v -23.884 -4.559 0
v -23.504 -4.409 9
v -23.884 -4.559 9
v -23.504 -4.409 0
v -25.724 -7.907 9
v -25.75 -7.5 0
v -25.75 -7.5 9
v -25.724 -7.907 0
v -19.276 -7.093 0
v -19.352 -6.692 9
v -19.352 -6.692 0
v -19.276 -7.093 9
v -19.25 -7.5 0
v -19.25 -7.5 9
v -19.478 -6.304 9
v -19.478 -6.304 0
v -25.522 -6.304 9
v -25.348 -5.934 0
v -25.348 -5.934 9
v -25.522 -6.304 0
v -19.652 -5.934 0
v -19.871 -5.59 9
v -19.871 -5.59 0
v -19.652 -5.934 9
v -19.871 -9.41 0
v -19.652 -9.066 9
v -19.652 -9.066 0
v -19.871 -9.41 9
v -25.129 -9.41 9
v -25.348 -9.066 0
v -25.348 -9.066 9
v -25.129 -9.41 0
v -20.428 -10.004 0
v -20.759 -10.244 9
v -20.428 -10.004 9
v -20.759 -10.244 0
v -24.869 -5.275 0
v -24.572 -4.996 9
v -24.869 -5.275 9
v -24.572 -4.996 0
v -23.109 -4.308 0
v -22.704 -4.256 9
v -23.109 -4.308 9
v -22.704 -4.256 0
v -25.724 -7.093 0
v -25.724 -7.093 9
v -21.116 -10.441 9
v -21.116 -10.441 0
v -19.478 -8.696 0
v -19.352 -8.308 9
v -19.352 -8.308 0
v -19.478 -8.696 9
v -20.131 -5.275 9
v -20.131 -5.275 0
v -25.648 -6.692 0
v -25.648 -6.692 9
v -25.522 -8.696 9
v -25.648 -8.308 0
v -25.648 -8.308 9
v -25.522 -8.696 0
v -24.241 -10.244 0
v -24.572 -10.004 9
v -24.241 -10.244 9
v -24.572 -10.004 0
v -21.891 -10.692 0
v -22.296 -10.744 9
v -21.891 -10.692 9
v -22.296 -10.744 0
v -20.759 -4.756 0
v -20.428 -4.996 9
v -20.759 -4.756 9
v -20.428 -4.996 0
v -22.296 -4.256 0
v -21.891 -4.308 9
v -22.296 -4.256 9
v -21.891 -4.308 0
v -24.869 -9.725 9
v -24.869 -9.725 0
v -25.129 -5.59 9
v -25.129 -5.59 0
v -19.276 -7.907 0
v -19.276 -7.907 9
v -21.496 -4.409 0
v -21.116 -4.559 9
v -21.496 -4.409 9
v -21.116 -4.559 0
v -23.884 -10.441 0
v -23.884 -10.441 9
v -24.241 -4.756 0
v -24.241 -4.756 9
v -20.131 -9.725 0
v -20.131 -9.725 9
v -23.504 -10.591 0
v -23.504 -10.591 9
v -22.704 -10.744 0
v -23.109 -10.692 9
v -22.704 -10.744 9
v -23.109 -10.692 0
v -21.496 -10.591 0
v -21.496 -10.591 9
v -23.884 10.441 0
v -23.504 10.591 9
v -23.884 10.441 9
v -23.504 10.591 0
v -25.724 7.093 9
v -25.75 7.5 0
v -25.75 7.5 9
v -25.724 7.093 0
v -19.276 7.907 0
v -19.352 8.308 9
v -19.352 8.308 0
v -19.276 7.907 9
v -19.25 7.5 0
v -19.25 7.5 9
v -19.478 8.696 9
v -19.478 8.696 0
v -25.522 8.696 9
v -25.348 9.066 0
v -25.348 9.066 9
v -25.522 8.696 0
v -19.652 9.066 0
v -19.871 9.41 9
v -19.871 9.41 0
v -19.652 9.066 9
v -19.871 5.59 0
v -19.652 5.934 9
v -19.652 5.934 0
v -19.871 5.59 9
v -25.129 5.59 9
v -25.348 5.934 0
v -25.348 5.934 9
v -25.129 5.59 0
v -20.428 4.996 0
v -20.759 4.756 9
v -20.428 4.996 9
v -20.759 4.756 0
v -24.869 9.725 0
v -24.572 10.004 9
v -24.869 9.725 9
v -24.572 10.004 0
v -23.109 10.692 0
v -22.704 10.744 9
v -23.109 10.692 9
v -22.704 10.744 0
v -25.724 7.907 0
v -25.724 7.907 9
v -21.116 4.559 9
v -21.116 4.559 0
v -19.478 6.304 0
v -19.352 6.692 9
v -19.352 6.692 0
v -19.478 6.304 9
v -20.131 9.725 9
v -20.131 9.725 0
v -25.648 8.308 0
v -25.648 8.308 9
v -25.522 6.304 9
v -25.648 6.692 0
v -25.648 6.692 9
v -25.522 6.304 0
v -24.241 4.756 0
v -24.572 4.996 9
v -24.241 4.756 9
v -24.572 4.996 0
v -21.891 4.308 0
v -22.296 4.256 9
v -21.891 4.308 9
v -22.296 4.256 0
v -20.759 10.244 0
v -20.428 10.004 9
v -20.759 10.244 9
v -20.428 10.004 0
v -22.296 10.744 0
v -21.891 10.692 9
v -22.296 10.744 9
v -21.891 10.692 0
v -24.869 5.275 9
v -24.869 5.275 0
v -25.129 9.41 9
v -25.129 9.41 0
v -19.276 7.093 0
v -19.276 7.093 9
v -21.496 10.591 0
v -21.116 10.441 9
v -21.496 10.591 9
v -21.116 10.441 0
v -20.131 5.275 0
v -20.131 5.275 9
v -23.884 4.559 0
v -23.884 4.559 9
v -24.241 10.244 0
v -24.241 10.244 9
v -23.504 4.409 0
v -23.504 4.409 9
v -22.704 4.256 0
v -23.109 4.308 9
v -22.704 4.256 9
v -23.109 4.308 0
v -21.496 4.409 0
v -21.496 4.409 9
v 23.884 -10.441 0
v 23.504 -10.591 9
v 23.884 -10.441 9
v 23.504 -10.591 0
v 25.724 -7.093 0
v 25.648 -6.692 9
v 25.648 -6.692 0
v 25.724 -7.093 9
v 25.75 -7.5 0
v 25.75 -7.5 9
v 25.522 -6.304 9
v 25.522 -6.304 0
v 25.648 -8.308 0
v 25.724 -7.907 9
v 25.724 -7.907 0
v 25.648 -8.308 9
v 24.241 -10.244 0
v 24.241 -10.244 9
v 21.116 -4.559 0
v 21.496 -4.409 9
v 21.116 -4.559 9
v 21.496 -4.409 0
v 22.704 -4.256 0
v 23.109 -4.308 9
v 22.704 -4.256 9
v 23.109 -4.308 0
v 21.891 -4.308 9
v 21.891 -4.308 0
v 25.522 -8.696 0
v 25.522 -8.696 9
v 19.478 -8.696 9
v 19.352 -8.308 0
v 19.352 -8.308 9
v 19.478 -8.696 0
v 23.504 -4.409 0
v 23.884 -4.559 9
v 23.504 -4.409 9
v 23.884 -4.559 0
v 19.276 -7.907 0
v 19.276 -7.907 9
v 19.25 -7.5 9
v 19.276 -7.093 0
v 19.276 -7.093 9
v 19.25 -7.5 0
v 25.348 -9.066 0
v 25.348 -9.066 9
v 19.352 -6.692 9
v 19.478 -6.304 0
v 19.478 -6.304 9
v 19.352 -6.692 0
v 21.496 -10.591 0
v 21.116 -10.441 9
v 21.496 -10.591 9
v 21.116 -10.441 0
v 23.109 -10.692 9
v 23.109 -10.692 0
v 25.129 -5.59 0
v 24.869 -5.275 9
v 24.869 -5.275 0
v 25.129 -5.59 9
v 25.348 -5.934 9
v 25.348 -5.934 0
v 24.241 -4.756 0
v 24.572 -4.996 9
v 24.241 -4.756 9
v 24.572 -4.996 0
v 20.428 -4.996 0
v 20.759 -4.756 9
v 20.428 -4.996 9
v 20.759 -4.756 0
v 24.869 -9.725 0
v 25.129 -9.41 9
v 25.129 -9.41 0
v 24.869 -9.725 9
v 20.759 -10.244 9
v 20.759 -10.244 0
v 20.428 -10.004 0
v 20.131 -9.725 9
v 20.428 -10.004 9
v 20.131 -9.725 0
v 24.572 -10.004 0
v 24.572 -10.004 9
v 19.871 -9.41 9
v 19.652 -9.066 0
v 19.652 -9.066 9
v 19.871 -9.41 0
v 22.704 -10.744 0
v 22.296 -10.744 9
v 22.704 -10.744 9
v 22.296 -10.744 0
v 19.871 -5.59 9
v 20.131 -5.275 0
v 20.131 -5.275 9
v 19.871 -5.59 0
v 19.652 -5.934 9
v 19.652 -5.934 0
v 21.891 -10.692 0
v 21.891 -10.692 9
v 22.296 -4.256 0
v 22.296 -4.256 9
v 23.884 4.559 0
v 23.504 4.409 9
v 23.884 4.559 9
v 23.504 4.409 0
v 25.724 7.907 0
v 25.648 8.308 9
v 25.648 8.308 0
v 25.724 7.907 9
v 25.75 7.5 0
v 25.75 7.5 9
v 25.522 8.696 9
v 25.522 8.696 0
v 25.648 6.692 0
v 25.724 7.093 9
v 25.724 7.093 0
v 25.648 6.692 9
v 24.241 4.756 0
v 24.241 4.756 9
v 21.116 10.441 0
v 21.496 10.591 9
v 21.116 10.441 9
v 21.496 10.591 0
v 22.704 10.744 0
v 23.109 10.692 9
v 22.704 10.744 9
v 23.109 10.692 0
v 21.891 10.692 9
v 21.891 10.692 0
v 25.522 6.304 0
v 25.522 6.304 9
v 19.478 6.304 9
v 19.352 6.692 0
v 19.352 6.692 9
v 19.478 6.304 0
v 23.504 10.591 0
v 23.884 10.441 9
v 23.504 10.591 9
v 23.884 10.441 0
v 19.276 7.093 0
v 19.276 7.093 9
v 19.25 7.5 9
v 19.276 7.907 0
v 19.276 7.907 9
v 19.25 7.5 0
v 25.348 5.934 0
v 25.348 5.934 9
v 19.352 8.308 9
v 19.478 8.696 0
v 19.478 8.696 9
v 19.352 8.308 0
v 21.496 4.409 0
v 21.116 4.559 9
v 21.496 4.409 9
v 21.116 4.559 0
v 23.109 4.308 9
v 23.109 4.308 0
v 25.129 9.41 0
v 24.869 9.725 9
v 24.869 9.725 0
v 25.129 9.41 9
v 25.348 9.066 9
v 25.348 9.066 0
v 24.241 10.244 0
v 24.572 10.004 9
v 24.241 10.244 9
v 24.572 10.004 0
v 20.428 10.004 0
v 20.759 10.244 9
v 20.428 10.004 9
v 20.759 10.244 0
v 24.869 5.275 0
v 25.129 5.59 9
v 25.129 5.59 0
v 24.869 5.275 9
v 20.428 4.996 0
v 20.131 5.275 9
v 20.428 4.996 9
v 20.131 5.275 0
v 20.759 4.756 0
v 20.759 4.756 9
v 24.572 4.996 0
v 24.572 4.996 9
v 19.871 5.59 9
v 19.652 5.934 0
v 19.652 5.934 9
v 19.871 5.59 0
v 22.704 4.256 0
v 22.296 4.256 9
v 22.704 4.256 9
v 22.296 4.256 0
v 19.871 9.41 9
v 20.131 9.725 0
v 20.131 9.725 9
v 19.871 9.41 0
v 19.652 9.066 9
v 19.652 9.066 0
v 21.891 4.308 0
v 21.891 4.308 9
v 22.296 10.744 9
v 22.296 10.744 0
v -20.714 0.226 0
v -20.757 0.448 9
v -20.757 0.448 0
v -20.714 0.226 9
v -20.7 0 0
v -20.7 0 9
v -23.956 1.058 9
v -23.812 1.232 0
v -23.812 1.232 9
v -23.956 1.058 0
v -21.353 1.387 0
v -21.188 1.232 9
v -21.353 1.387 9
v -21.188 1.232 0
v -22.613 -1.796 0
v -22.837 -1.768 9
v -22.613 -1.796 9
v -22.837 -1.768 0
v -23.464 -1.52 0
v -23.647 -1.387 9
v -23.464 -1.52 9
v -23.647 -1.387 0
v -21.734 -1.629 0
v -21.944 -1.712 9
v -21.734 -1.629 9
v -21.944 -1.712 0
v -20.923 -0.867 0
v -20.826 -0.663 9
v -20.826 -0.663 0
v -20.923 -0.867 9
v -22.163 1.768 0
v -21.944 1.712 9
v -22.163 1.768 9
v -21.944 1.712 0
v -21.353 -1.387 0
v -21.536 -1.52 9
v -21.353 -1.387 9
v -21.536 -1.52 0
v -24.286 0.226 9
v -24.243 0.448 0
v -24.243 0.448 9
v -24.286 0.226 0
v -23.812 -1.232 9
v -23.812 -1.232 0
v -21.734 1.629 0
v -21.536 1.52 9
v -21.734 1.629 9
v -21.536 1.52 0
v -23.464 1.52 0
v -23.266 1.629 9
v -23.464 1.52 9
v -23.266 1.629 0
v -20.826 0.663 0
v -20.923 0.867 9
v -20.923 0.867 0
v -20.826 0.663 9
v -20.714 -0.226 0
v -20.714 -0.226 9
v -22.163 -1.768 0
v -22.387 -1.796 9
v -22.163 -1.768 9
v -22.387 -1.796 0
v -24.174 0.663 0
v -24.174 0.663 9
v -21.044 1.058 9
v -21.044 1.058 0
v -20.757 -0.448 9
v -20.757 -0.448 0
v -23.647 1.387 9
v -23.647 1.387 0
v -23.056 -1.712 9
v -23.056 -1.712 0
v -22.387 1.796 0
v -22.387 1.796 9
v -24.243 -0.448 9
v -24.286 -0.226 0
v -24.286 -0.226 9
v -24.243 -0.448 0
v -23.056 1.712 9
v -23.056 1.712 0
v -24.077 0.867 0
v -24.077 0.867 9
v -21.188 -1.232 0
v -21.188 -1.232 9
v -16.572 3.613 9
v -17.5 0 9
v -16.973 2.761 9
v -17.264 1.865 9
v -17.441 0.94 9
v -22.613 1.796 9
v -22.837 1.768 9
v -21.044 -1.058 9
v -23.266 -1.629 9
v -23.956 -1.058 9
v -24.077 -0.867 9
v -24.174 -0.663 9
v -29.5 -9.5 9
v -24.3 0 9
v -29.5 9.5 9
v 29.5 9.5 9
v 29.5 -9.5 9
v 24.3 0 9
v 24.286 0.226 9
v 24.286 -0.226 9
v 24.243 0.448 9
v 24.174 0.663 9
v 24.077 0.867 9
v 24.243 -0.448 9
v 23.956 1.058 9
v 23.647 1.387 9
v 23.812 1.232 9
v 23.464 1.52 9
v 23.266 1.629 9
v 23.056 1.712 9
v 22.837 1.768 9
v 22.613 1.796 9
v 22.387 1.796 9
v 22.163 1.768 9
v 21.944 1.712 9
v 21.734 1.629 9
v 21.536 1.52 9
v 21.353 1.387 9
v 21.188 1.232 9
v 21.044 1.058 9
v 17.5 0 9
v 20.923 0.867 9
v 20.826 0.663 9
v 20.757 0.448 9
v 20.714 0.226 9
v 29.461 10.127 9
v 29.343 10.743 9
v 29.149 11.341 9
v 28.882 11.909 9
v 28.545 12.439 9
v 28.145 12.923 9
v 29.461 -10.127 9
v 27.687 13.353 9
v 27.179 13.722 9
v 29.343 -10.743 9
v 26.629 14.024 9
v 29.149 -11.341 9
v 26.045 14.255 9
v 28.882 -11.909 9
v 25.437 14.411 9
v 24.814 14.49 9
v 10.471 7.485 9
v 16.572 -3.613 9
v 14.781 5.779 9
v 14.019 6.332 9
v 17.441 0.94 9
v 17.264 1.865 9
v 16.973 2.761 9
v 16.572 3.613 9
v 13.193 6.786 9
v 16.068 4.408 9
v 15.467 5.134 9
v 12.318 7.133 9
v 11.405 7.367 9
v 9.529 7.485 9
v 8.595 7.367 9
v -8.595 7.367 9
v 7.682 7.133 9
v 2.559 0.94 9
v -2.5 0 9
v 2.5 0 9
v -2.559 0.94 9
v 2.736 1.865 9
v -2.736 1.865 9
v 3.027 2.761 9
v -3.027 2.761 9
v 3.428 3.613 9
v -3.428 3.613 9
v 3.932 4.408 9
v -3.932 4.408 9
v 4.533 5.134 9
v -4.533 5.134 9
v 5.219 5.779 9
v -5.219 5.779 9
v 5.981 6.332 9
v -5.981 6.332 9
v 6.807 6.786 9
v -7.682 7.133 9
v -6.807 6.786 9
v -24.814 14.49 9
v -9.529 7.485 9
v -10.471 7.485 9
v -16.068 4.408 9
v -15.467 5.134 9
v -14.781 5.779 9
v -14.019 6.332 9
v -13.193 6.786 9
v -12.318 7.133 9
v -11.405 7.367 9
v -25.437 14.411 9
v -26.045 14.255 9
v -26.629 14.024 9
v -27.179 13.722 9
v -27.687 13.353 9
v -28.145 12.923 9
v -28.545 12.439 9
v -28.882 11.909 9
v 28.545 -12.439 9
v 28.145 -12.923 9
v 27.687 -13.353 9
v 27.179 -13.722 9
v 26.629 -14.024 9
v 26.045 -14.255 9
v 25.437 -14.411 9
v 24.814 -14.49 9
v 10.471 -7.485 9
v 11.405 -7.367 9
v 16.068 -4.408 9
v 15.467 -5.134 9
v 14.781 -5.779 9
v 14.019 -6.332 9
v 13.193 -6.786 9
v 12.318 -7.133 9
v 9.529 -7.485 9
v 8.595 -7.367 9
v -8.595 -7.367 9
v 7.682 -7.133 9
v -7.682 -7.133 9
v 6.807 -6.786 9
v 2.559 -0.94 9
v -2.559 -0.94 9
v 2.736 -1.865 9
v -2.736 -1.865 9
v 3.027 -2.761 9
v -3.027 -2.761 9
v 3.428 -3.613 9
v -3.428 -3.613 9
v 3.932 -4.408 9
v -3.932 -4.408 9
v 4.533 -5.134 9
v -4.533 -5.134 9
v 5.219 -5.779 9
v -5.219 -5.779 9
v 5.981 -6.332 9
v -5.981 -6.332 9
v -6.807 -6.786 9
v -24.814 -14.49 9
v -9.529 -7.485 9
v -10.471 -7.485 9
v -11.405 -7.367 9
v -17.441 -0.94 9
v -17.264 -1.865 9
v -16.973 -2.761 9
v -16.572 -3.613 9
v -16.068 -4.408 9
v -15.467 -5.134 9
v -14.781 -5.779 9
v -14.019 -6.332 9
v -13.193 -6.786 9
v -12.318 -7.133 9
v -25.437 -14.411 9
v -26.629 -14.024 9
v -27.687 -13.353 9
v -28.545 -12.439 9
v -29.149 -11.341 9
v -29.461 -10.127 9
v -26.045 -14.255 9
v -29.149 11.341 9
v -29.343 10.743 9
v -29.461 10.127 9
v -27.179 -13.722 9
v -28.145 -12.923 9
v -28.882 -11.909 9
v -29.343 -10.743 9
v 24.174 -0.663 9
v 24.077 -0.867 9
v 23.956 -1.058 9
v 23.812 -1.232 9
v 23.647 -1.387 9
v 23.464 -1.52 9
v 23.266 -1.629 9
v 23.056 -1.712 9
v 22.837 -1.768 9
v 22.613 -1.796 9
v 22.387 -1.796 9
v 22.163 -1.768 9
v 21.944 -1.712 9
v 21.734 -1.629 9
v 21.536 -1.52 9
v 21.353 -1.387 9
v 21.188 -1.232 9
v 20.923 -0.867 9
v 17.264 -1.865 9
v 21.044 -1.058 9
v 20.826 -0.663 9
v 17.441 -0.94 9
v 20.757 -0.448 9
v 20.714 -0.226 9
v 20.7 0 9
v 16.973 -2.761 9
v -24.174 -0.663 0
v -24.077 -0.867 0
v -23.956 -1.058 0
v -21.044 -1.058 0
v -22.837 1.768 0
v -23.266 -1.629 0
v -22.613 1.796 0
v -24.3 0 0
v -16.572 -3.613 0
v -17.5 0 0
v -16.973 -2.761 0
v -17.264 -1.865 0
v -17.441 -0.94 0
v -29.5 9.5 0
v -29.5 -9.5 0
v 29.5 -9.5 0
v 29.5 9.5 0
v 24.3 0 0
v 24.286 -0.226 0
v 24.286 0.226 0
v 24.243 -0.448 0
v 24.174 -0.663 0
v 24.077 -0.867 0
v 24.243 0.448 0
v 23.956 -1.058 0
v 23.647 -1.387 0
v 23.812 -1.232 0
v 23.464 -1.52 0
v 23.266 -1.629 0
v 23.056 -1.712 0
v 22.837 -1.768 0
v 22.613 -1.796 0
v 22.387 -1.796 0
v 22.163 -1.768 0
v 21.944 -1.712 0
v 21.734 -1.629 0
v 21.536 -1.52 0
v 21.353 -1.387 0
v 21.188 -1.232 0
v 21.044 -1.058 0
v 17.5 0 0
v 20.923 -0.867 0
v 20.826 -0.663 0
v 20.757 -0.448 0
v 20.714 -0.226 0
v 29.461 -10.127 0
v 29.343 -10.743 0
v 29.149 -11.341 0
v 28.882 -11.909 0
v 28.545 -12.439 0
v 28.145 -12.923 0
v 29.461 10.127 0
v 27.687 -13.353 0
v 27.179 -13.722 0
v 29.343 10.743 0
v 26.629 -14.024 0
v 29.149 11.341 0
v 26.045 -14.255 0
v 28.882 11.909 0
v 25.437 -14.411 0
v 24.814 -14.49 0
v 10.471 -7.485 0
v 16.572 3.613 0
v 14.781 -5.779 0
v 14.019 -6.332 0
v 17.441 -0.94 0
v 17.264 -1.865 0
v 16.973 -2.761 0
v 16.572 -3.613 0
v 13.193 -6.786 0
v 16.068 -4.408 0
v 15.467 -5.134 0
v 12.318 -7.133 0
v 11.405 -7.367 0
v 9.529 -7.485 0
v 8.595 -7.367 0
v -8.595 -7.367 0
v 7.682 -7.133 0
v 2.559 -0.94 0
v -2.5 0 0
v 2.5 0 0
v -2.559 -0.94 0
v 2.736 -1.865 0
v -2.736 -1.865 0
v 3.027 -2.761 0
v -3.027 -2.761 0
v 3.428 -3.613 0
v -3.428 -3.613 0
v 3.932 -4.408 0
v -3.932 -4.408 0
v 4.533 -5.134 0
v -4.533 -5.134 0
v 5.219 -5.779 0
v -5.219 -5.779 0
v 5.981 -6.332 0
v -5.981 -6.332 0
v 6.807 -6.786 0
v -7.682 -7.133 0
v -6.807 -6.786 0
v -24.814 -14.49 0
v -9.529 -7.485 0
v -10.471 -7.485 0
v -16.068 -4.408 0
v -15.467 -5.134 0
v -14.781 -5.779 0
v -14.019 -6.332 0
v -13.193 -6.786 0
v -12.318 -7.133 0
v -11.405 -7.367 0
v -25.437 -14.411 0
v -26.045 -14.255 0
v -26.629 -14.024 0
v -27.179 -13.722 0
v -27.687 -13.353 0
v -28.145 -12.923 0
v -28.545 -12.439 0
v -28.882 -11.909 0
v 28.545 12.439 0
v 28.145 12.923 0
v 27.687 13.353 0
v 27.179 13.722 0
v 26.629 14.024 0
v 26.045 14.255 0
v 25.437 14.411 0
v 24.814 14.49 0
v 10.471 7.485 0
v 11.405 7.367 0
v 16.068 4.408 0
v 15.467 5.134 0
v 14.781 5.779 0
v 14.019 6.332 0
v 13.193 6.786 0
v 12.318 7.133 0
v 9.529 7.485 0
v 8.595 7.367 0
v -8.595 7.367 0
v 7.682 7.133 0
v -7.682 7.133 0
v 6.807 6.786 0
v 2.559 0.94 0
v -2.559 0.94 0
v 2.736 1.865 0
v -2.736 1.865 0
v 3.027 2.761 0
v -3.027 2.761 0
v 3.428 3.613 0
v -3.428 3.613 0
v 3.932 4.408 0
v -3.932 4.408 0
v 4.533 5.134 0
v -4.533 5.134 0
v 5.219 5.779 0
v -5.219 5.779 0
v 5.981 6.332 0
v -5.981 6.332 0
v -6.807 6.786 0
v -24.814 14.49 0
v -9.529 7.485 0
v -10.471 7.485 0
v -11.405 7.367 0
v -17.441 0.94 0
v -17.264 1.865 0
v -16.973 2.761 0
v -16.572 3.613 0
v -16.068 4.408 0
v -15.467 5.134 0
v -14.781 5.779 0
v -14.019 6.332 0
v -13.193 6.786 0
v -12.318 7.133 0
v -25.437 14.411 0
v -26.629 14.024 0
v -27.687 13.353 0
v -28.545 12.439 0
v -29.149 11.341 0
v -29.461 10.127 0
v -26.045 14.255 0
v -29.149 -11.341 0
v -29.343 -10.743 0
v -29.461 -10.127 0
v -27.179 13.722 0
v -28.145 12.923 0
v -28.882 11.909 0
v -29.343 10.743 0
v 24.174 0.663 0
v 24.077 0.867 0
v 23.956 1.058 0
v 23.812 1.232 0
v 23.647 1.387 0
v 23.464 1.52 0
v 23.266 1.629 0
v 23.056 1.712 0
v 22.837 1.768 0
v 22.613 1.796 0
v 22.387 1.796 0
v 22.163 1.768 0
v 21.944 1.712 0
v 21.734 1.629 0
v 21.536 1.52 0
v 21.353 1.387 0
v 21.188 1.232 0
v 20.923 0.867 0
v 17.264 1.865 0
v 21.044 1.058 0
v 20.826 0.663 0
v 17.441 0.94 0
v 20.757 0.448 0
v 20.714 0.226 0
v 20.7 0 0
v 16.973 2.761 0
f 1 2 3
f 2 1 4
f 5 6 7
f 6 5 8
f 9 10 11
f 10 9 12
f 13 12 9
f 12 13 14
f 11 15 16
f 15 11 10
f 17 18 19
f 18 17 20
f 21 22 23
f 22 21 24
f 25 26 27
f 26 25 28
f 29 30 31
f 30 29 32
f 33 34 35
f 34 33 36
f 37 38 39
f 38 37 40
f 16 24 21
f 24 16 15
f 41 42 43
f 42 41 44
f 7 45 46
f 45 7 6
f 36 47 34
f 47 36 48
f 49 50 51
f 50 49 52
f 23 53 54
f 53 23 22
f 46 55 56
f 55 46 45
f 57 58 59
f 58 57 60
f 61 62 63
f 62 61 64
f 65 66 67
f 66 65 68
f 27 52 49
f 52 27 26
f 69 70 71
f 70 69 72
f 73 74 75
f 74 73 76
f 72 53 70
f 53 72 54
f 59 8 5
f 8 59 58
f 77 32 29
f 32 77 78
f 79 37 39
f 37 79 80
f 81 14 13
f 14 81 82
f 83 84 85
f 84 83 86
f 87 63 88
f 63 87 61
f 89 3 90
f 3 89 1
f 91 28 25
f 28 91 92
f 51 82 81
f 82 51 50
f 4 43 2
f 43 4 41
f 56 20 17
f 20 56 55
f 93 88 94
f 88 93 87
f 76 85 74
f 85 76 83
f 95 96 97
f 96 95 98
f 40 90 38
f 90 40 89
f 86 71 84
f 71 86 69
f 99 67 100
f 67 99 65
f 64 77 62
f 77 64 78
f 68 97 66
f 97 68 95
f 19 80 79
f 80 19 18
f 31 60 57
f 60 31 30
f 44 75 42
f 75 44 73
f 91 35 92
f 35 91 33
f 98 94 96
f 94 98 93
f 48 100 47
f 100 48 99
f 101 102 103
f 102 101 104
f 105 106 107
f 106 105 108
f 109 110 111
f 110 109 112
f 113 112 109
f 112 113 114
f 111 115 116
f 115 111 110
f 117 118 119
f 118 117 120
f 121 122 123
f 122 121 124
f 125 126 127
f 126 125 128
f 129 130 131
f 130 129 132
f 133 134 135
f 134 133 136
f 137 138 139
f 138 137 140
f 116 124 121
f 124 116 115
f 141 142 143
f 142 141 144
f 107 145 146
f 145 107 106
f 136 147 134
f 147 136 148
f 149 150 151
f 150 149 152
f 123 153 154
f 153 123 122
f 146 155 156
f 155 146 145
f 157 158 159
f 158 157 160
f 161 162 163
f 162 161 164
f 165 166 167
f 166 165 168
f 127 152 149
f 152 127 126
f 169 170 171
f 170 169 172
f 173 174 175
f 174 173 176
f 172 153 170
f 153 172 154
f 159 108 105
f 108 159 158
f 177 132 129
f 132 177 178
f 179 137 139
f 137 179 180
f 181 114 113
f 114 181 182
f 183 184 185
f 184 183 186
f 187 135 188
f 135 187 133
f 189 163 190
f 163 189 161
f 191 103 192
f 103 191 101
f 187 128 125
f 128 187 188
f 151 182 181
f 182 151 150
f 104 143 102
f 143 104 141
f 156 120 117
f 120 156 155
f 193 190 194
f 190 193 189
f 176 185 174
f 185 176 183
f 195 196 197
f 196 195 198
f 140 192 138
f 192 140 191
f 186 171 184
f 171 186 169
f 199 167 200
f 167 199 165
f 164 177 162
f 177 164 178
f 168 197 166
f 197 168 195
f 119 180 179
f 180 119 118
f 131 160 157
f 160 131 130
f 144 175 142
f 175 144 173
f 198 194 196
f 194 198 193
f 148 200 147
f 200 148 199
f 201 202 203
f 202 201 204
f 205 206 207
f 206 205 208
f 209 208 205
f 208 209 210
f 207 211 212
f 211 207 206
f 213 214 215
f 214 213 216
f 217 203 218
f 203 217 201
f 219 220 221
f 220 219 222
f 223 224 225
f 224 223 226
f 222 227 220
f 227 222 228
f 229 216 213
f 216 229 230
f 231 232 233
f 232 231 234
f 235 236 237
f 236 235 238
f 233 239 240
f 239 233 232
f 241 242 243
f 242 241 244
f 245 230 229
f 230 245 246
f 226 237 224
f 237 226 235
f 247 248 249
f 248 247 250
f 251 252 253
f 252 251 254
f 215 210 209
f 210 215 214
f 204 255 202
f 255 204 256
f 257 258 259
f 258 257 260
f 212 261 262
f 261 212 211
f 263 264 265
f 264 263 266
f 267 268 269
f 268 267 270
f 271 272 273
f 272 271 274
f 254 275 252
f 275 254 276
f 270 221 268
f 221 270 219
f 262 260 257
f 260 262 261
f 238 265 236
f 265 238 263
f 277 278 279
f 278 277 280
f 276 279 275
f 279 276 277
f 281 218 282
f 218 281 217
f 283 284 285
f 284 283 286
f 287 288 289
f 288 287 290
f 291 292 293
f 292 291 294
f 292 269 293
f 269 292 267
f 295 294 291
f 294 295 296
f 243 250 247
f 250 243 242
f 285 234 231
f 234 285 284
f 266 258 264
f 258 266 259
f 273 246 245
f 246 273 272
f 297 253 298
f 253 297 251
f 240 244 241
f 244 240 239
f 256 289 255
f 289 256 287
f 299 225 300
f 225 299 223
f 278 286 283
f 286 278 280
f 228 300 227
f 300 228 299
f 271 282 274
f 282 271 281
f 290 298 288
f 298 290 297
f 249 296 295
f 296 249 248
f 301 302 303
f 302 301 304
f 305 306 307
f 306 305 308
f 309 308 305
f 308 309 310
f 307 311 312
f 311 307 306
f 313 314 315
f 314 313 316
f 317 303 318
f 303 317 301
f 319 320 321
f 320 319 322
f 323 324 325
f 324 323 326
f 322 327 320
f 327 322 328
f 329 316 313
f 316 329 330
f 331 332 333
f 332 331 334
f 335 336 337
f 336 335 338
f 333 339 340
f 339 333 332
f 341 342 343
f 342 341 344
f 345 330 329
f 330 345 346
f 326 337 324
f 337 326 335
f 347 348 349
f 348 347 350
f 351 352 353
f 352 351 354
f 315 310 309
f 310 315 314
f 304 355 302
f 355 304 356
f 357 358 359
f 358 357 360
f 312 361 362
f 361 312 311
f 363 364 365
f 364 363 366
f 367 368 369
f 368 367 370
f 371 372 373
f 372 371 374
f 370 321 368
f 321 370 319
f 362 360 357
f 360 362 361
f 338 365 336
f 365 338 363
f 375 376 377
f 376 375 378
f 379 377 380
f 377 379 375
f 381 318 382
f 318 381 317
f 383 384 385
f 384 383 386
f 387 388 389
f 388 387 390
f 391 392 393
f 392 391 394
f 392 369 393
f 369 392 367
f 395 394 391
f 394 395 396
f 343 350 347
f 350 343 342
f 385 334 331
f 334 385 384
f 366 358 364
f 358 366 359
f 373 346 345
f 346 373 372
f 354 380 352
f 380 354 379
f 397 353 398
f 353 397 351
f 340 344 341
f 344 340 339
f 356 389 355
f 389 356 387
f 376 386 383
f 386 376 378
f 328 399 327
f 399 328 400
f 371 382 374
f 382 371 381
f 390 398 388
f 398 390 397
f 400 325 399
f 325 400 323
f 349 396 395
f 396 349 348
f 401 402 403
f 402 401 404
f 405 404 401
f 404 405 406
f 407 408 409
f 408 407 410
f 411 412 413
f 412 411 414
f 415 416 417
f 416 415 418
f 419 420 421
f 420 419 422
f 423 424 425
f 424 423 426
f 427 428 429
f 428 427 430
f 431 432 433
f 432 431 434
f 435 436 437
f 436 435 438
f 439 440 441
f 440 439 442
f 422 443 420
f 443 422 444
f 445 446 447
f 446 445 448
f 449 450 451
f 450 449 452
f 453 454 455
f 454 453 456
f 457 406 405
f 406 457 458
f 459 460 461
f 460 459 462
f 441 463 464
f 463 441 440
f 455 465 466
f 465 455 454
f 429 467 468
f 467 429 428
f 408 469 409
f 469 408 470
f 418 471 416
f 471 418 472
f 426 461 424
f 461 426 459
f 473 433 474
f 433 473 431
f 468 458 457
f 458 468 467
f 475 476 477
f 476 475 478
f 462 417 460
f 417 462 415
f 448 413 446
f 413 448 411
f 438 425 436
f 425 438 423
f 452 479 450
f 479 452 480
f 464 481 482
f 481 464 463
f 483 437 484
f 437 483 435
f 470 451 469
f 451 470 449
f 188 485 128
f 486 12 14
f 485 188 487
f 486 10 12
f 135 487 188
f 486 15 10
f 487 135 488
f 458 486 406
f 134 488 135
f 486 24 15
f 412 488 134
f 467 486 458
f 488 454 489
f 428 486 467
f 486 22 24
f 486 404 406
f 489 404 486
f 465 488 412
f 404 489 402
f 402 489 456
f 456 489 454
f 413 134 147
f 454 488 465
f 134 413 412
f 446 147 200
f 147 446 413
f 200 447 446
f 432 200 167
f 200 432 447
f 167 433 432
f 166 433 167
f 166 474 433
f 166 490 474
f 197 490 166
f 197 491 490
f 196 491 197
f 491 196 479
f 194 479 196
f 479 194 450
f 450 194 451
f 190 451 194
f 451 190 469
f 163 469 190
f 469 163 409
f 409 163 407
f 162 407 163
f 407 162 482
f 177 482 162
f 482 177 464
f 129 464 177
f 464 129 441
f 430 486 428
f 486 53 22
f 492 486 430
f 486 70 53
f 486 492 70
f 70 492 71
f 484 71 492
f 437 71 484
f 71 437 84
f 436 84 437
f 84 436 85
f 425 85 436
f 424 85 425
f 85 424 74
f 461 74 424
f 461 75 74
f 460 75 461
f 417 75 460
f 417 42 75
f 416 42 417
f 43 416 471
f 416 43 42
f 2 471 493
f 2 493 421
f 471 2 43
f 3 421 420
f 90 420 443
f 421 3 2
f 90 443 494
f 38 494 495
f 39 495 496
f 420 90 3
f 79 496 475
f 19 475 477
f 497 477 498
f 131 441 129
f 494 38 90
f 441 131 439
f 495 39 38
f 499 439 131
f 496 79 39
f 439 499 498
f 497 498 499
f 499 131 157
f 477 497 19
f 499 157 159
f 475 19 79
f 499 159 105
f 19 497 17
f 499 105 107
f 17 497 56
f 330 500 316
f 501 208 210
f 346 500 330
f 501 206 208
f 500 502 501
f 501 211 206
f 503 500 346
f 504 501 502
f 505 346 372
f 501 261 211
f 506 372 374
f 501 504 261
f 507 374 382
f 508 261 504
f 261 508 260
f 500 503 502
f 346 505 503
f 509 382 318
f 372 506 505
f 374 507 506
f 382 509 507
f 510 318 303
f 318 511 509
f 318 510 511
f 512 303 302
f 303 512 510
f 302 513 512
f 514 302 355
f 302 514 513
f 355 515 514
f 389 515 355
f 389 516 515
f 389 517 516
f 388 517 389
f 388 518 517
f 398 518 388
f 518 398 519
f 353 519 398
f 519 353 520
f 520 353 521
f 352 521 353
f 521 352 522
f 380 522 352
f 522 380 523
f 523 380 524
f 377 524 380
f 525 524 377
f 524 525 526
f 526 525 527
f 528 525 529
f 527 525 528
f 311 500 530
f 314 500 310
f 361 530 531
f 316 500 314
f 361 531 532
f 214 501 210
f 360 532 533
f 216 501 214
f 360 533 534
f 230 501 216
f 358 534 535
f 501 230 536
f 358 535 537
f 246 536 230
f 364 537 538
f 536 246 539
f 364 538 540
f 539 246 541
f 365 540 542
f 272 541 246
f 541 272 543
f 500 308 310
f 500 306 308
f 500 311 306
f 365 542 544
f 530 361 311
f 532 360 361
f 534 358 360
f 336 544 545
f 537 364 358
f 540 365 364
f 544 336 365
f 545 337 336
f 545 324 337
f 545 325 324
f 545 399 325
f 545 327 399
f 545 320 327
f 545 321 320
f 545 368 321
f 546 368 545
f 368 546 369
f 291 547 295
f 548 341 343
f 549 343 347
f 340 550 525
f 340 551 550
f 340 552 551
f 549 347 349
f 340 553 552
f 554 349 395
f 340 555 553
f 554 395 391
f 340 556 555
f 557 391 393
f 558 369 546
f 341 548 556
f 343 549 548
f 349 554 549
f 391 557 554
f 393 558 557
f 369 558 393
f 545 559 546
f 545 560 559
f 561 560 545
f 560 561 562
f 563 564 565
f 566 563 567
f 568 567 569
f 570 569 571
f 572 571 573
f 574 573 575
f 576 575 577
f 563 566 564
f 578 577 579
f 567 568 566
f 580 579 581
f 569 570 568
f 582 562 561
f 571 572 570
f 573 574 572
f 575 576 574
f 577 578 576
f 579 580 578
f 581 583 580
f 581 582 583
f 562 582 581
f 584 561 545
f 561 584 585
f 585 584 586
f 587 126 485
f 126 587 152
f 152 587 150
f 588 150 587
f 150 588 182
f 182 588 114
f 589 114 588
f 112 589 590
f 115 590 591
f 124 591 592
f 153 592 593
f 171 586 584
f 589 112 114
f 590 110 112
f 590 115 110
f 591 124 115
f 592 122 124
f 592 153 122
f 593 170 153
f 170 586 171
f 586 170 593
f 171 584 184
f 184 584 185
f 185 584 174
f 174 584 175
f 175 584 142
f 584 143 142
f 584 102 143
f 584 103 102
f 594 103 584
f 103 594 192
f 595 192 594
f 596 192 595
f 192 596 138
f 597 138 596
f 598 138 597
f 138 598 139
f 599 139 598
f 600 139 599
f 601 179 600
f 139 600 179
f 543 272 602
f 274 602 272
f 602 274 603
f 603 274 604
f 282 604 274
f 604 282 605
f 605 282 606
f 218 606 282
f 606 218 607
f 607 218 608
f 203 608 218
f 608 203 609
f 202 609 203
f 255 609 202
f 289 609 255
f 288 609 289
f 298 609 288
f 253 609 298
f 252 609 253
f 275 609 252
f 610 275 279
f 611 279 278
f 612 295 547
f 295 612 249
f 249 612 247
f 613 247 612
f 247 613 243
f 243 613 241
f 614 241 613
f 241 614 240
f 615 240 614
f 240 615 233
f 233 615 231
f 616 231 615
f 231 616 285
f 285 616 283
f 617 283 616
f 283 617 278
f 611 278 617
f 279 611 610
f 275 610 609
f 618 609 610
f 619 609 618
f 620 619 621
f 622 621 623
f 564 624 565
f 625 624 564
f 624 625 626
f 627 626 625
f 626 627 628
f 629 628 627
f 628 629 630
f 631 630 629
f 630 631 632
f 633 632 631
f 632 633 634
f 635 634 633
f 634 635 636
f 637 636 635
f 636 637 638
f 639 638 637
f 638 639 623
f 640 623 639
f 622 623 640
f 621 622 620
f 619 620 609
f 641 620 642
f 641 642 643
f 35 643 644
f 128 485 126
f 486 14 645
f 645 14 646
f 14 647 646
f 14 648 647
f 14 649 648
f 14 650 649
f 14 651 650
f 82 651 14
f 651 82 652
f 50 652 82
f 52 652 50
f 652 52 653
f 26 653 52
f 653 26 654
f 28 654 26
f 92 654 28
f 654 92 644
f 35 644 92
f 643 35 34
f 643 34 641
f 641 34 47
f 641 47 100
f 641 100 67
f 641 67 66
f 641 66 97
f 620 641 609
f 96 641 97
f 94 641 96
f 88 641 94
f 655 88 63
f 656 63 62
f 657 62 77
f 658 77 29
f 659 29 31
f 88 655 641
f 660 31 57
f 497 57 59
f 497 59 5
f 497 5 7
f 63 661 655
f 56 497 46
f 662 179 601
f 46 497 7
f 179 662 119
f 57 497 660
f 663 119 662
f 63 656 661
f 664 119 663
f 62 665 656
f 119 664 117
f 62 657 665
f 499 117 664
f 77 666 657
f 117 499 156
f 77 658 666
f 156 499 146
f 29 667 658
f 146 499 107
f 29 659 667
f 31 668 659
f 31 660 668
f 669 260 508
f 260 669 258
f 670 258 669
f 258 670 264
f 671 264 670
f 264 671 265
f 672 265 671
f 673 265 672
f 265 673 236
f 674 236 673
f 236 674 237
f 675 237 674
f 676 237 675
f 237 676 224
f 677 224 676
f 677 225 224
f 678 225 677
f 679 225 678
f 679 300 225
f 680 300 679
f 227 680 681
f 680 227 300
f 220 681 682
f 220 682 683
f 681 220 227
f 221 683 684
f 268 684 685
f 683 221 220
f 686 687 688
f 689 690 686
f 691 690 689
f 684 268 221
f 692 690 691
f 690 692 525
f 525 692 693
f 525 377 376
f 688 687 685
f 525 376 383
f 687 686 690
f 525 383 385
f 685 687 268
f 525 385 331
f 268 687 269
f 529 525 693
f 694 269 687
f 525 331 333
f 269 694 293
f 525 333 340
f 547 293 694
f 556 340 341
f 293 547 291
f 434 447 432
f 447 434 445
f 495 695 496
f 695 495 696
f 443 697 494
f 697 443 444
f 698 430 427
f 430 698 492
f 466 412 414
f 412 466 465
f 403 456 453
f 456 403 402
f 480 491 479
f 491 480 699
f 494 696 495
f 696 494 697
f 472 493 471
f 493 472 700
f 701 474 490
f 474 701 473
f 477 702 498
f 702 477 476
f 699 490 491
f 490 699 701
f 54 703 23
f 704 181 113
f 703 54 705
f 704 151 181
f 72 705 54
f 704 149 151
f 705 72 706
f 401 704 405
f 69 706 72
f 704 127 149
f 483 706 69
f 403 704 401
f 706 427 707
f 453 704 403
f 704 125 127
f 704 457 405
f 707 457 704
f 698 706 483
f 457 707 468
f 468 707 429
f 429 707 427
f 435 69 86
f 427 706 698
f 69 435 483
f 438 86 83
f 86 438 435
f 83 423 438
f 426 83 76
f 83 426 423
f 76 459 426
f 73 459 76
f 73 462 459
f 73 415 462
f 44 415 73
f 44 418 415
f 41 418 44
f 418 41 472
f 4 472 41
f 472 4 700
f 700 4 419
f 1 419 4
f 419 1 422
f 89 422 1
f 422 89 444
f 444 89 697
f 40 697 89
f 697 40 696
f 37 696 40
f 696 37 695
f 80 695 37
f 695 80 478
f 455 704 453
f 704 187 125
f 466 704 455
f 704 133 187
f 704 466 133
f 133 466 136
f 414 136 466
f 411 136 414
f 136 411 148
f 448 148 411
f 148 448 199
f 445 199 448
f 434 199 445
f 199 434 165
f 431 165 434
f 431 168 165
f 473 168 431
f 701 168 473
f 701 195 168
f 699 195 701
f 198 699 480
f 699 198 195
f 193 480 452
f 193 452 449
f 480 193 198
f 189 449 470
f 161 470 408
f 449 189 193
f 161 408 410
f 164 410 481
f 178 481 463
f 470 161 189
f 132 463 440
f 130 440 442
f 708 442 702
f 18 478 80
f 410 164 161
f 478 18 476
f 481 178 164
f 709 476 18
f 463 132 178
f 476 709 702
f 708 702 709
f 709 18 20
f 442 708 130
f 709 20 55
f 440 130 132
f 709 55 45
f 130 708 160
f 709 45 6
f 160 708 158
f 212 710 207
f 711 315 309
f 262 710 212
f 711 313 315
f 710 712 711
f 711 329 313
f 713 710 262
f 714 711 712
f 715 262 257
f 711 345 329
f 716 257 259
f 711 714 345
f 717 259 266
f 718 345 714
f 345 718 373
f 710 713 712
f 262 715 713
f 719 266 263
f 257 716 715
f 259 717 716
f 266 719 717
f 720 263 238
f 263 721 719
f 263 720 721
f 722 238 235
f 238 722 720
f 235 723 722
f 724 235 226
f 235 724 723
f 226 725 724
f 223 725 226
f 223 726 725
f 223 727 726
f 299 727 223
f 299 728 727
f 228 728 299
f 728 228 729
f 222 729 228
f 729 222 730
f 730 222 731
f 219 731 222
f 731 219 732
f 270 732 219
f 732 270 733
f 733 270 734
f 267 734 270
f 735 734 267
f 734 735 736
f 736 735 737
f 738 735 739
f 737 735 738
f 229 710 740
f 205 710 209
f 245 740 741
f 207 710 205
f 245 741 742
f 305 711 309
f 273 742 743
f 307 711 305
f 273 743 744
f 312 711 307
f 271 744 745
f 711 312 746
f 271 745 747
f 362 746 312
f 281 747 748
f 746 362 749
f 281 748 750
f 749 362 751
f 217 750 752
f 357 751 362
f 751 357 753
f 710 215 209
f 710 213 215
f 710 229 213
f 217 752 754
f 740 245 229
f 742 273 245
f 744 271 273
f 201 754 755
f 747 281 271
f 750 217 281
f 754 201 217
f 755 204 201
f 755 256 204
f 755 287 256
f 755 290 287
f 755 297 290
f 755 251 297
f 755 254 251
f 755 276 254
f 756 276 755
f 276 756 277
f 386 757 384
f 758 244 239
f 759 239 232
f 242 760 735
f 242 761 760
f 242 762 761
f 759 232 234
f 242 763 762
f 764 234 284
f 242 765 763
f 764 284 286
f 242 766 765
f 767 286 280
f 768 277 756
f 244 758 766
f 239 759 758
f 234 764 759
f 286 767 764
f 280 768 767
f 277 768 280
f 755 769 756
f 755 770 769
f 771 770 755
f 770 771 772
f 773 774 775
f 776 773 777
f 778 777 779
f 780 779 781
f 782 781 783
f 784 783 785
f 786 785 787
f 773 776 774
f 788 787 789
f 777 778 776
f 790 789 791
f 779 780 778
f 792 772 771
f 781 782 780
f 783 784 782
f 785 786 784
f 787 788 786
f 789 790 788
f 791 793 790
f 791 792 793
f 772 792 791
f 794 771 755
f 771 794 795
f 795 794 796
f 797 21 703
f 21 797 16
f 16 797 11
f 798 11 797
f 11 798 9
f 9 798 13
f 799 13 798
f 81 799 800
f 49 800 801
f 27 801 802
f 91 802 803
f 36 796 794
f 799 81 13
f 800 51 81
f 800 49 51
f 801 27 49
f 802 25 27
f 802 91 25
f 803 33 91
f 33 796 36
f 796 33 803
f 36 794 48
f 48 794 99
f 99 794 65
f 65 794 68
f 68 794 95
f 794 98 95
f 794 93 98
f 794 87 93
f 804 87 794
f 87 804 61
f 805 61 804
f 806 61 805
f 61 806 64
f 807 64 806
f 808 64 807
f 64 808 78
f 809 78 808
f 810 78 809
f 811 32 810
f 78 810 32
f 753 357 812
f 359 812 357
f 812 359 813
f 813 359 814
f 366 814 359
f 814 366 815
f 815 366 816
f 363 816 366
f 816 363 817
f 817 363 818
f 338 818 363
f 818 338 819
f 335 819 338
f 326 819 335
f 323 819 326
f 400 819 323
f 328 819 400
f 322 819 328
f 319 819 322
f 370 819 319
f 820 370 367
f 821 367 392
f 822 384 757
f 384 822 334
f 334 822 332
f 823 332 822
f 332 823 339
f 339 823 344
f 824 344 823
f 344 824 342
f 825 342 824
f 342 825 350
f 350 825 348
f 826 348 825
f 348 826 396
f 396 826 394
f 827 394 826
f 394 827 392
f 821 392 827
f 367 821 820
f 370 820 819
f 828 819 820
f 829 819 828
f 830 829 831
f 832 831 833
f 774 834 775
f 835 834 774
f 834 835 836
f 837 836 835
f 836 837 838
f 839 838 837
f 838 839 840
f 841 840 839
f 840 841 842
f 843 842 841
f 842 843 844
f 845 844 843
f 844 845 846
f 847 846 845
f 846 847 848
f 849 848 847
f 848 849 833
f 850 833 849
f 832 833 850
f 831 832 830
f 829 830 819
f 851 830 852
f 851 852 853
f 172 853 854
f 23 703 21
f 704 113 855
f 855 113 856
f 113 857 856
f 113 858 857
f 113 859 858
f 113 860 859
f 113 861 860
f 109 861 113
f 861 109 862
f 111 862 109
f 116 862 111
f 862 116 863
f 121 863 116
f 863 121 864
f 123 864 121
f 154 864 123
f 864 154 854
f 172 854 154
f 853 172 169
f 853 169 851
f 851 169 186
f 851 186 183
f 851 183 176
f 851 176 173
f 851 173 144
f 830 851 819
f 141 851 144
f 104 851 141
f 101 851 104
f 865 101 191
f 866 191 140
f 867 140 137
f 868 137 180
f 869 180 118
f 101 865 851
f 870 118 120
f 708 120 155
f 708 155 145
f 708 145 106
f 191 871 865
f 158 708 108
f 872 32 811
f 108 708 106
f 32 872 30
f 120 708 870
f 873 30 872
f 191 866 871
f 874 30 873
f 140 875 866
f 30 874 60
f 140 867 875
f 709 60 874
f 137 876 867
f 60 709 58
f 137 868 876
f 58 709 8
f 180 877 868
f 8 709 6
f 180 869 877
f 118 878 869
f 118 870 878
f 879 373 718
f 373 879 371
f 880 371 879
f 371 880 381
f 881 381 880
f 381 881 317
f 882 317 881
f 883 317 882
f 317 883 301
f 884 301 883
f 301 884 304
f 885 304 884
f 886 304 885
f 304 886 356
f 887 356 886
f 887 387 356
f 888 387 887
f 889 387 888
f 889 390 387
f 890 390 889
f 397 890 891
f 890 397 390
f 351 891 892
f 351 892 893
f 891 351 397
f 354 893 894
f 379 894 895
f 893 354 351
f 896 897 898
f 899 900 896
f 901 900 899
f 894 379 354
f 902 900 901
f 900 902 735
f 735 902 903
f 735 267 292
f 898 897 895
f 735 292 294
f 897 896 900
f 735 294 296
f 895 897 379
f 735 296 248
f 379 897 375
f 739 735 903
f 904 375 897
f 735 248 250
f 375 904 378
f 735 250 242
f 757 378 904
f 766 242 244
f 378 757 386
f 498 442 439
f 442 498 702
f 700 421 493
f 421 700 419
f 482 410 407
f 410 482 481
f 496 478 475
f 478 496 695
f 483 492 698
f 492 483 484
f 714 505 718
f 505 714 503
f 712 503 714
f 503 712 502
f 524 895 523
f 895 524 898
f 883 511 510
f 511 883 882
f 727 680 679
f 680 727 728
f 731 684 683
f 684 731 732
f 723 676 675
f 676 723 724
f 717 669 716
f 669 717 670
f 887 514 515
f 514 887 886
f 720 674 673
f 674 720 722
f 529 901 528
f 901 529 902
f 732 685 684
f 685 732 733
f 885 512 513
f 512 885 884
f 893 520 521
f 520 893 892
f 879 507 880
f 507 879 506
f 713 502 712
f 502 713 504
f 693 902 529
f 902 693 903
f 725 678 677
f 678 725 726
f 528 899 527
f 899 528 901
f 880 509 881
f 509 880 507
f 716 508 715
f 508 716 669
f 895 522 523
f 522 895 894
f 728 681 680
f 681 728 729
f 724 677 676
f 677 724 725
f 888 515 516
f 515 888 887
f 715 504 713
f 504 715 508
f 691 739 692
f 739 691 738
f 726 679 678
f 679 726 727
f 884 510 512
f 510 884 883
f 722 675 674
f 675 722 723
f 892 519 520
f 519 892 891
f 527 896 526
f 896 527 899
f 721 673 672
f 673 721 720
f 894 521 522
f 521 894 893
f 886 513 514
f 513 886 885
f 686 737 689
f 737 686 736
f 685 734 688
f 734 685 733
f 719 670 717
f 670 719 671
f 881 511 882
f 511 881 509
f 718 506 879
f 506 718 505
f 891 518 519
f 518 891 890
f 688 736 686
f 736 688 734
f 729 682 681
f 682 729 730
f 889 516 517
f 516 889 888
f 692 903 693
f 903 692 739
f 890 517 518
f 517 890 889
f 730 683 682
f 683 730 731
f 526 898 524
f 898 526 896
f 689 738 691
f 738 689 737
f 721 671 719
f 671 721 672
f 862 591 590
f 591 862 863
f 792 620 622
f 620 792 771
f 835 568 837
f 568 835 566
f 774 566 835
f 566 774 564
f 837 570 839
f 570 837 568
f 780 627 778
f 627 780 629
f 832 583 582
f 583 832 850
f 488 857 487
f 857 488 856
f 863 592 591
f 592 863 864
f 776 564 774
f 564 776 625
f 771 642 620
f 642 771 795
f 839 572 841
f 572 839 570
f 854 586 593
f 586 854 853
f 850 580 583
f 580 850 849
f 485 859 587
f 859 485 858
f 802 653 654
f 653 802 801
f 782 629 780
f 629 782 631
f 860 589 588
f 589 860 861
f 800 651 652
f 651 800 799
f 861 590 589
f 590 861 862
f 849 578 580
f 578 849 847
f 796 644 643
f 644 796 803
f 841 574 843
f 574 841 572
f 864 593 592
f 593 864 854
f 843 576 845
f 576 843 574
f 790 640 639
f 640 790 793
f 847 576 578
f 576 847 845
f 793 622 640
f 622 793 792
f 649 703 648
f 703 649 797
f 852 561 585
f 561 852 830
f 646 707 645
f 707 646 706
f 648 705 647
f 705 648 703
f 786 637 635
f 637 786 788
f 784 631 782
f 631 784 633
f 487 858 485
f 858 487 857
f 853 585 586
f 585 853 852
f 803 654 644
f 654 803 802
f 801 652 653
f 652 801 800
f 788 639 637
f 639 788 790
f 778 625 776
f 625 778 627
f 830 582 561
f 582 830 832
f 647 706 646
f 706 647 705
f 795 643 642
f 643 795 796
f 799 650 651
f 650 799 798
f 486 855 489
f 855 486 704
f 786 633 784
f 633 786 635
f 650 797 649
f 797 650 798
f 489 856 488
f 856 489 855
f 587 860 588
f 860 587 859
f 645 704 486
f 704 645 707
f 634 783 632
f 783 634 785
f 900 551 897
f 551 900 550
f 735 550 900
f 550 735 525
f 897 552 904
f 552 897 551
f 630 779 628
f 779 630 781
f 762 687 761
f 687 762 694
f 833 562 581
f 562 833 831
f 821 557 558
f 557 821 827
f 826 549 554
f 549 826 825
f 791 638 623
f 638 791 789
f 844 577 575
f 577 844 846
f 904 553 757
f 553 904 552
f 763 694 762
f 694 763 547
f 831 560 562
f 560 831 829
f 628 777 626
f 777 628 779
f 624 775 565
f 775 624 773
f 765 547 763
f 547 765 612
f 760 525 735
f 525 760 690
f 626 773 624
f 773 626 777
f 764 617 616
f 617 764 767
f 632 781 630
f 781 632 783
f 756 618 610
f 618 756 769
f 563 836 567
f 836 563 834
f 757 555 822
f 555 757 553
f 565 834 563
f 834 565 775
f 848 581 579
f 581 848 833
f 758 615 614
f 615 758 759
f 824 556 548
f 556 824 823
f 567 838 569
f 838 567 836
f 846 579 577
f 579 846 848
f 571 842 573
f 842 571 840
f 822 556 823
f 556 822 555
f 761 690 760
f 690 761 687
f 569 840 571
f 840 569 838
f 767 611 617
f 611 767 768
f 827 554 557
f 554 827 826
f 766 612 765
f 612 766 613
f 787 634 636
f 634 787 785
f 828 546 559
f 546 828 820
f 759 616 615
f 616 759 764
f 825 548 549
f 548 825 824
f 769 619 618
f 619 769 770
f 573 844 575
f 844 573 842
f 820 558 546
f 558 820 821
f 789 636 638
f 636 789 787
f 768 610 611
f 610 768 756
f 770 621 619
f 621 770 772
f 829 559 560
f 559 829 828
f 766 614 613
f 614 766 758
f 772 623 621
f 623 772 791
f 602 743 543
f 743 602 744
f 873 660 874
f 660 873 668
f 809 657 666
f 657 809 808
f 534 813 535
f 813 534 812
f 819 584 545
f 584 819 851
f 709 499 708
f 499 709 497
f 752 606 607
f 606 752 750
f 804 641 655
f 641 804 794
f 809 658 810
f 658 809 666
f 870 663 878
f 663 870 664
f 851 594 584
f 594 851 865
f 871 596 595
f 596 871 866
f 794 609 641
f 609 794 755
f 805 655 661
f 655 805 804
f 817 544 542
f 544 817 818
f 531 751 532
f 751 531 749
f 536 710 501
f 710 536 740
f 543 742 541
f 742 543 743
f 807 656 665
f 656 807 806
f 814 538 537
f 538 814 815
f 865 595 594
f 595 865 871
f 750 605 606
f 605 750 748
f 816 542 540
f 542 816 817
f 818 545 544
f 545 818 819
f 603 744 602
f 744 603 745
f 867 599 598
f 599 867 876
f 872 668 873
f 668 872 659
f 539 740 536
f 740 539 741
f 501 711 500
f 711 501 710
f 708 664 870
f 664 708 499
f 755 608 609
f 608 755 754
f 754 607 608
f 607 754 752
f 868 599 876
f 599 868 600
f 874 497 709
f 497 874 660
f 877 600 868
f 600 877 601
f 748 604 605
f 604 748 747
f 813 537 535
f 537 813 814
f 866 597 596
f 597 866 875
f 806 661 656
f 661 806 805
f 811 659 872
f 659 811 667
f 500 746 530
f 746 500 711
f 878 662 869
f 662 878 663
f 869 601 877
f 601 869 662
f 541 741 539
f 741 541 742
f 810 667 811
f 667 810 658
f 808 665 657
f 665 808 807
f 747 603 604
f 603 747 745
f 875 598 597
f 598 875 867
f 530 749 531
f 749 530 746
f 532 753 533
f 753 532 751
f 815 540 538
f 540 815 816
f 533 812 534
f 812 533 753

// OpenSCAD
$fn = 50;


difference() {
	union() {
		hull() {
			translate(v = [-24.5000000000, 9.5000000000, 0]) {
				cylinder(h = 9, r = 5);
			}
			translate(v = [24.5000000000, 9.5000000000, 0]) {
				cylinder(h = 9, r = 5);
			}
			translate(v = [-24.5000000000, -9.5000000000, 0]) {
				cylinder(h = 9, r = 5);
			}
			translate(v = [24.5000000000, -9.5000000000, 0]) {
				cylinder(h = 9, r = 5);
			}
		}
	}
	union() {
		#translate(v = [-22.5000000000, -7.5000000000, 0]) {
			cylinder(h = 9, r = 3.2500000000);
		}
		#translate(v = [-22.5000000000, 7.5000000000, 0]) {
			cylinder(h = 9, r = 3.2500000000);
		}
		#translate(v = [22.5000000000, -7.5000000000, 0]) {
			cylinder(h = 9, r = 3.2500000000);
		}
		#translate(v = [22.5000000000, 7.5000000000, 0]) {
			cylinder(h = 9, r = 3.2500000000);
		}
		#translate(v = [-22.5000000000, -7.5000000000, -100.0000000000]) {
			cylinder(h = 200, r = 3.2500000000);
		}
		#translate(v = [-22.5000000000, 7.5000000000, -100.0000000000]) {
			cylinder(h = 200, r = 3.2500000000);
		}
		#translate(v = [22.5000000000, -7.5000000000, -100.0000000000]) {
			cylinder(h = 200, r = 3.2500000000);
		}
		#translate(v = [22.5000000000, 7.5000000000, -100.0000000000]) {
			cylinder(h = 200, r = 3.2500000000);
		}
		#translate(v = [-22.5000000000, -7.5000000000, 0]) {
			cylinder(h = 9, r = 1.8000000000);
		}
		#translate(v = [-22.5000000000, 0.0000000000, 0]) {
			cylinder(h = 9, r = 1.8000000000);
		}
		#translate(v = [-22.5000000000, 7.5000000000, 0]) {
			cylinder(h = 9, r = 1.8000000000);
		}
		#translate(v = [22.5000000000, -7.5000000000, 0]) {
			cylinder(h = 9, r = 1.8000000000);
		}
		#translate(v = [22.5000000000, 0.0000000000, 0]) {
			cylinder(h = 9, r = 1.8000000000);
		}
		#translate(v = [22.5000000000, 7.5000000000, 0]) {
			cylinder(h = 9, r = 1.8000000000);
		}
		#translate(v = [-22.5000000000, -7.5000000000, 0]) {
			cylinder(h = 9, r = 1.8000000000);
		}
		#translate(v = [-22.5000000000, 0.0000000000, 0]) {
			cylinder(h = 9, r = 1.8000000000);
		}
		#translate(v = [-22.5000000000, 7.5000000000, 0]) {
			cylinder(h = 9, r = 1.8000000000);
		}
		#translate(v = [22.5000000000, -7.5000000000, 0]) {
			cylinder(h = 9, r = 1.8000000000);
		}
		#translate(v = [22.5000000000, 0.0000000000, 0]) {
			cylinder(h = 9, r = 1.8000000000);
		}
		#translate(v = [22.5000000000, 7.5000000000, 0]) {
			cylinder(h = 9, r = 1.8000000000);
		}
		#translate(v = [-22.5000000000, -7.5000000000, 0]) {
			cylinder(h = 9, r = 1.8000000000);
		}
		#translate(v = [-22.5000000000, 0.0000000000, 0]) {
			cylinder(h = 9, r = 1.8000000000);
		}
		#translate(v = [-22.5000000000, 7.5000000000, 0]) {
			cylinder(h = 9, r = 1.8000000000);
		}
		#translate(v = [22.5000000000, -7.5000000000, 0]) {
			cylinder(h = 9, r = 1.8000000000);
		}
		#translate(v = [22.5000000000, 0.0000000000, 0]) {
			cylinder(h = 9, r = 1.8000000000);
		}
		#translate(v = [22.5000000000, 7.5000000000, 0]) {
			cylinder(h = 9, r = 1.8000000000);
		}
		#translate(v = [-10.0000000000, 0, 0]) {
			cylinder(h = 9, r = 7.5000000000);
		}
		#translate(v = [10.0000000000, 0, 0]) {
			cylinder(h = 9, r = 7.5000000000);
		}
	}
}
